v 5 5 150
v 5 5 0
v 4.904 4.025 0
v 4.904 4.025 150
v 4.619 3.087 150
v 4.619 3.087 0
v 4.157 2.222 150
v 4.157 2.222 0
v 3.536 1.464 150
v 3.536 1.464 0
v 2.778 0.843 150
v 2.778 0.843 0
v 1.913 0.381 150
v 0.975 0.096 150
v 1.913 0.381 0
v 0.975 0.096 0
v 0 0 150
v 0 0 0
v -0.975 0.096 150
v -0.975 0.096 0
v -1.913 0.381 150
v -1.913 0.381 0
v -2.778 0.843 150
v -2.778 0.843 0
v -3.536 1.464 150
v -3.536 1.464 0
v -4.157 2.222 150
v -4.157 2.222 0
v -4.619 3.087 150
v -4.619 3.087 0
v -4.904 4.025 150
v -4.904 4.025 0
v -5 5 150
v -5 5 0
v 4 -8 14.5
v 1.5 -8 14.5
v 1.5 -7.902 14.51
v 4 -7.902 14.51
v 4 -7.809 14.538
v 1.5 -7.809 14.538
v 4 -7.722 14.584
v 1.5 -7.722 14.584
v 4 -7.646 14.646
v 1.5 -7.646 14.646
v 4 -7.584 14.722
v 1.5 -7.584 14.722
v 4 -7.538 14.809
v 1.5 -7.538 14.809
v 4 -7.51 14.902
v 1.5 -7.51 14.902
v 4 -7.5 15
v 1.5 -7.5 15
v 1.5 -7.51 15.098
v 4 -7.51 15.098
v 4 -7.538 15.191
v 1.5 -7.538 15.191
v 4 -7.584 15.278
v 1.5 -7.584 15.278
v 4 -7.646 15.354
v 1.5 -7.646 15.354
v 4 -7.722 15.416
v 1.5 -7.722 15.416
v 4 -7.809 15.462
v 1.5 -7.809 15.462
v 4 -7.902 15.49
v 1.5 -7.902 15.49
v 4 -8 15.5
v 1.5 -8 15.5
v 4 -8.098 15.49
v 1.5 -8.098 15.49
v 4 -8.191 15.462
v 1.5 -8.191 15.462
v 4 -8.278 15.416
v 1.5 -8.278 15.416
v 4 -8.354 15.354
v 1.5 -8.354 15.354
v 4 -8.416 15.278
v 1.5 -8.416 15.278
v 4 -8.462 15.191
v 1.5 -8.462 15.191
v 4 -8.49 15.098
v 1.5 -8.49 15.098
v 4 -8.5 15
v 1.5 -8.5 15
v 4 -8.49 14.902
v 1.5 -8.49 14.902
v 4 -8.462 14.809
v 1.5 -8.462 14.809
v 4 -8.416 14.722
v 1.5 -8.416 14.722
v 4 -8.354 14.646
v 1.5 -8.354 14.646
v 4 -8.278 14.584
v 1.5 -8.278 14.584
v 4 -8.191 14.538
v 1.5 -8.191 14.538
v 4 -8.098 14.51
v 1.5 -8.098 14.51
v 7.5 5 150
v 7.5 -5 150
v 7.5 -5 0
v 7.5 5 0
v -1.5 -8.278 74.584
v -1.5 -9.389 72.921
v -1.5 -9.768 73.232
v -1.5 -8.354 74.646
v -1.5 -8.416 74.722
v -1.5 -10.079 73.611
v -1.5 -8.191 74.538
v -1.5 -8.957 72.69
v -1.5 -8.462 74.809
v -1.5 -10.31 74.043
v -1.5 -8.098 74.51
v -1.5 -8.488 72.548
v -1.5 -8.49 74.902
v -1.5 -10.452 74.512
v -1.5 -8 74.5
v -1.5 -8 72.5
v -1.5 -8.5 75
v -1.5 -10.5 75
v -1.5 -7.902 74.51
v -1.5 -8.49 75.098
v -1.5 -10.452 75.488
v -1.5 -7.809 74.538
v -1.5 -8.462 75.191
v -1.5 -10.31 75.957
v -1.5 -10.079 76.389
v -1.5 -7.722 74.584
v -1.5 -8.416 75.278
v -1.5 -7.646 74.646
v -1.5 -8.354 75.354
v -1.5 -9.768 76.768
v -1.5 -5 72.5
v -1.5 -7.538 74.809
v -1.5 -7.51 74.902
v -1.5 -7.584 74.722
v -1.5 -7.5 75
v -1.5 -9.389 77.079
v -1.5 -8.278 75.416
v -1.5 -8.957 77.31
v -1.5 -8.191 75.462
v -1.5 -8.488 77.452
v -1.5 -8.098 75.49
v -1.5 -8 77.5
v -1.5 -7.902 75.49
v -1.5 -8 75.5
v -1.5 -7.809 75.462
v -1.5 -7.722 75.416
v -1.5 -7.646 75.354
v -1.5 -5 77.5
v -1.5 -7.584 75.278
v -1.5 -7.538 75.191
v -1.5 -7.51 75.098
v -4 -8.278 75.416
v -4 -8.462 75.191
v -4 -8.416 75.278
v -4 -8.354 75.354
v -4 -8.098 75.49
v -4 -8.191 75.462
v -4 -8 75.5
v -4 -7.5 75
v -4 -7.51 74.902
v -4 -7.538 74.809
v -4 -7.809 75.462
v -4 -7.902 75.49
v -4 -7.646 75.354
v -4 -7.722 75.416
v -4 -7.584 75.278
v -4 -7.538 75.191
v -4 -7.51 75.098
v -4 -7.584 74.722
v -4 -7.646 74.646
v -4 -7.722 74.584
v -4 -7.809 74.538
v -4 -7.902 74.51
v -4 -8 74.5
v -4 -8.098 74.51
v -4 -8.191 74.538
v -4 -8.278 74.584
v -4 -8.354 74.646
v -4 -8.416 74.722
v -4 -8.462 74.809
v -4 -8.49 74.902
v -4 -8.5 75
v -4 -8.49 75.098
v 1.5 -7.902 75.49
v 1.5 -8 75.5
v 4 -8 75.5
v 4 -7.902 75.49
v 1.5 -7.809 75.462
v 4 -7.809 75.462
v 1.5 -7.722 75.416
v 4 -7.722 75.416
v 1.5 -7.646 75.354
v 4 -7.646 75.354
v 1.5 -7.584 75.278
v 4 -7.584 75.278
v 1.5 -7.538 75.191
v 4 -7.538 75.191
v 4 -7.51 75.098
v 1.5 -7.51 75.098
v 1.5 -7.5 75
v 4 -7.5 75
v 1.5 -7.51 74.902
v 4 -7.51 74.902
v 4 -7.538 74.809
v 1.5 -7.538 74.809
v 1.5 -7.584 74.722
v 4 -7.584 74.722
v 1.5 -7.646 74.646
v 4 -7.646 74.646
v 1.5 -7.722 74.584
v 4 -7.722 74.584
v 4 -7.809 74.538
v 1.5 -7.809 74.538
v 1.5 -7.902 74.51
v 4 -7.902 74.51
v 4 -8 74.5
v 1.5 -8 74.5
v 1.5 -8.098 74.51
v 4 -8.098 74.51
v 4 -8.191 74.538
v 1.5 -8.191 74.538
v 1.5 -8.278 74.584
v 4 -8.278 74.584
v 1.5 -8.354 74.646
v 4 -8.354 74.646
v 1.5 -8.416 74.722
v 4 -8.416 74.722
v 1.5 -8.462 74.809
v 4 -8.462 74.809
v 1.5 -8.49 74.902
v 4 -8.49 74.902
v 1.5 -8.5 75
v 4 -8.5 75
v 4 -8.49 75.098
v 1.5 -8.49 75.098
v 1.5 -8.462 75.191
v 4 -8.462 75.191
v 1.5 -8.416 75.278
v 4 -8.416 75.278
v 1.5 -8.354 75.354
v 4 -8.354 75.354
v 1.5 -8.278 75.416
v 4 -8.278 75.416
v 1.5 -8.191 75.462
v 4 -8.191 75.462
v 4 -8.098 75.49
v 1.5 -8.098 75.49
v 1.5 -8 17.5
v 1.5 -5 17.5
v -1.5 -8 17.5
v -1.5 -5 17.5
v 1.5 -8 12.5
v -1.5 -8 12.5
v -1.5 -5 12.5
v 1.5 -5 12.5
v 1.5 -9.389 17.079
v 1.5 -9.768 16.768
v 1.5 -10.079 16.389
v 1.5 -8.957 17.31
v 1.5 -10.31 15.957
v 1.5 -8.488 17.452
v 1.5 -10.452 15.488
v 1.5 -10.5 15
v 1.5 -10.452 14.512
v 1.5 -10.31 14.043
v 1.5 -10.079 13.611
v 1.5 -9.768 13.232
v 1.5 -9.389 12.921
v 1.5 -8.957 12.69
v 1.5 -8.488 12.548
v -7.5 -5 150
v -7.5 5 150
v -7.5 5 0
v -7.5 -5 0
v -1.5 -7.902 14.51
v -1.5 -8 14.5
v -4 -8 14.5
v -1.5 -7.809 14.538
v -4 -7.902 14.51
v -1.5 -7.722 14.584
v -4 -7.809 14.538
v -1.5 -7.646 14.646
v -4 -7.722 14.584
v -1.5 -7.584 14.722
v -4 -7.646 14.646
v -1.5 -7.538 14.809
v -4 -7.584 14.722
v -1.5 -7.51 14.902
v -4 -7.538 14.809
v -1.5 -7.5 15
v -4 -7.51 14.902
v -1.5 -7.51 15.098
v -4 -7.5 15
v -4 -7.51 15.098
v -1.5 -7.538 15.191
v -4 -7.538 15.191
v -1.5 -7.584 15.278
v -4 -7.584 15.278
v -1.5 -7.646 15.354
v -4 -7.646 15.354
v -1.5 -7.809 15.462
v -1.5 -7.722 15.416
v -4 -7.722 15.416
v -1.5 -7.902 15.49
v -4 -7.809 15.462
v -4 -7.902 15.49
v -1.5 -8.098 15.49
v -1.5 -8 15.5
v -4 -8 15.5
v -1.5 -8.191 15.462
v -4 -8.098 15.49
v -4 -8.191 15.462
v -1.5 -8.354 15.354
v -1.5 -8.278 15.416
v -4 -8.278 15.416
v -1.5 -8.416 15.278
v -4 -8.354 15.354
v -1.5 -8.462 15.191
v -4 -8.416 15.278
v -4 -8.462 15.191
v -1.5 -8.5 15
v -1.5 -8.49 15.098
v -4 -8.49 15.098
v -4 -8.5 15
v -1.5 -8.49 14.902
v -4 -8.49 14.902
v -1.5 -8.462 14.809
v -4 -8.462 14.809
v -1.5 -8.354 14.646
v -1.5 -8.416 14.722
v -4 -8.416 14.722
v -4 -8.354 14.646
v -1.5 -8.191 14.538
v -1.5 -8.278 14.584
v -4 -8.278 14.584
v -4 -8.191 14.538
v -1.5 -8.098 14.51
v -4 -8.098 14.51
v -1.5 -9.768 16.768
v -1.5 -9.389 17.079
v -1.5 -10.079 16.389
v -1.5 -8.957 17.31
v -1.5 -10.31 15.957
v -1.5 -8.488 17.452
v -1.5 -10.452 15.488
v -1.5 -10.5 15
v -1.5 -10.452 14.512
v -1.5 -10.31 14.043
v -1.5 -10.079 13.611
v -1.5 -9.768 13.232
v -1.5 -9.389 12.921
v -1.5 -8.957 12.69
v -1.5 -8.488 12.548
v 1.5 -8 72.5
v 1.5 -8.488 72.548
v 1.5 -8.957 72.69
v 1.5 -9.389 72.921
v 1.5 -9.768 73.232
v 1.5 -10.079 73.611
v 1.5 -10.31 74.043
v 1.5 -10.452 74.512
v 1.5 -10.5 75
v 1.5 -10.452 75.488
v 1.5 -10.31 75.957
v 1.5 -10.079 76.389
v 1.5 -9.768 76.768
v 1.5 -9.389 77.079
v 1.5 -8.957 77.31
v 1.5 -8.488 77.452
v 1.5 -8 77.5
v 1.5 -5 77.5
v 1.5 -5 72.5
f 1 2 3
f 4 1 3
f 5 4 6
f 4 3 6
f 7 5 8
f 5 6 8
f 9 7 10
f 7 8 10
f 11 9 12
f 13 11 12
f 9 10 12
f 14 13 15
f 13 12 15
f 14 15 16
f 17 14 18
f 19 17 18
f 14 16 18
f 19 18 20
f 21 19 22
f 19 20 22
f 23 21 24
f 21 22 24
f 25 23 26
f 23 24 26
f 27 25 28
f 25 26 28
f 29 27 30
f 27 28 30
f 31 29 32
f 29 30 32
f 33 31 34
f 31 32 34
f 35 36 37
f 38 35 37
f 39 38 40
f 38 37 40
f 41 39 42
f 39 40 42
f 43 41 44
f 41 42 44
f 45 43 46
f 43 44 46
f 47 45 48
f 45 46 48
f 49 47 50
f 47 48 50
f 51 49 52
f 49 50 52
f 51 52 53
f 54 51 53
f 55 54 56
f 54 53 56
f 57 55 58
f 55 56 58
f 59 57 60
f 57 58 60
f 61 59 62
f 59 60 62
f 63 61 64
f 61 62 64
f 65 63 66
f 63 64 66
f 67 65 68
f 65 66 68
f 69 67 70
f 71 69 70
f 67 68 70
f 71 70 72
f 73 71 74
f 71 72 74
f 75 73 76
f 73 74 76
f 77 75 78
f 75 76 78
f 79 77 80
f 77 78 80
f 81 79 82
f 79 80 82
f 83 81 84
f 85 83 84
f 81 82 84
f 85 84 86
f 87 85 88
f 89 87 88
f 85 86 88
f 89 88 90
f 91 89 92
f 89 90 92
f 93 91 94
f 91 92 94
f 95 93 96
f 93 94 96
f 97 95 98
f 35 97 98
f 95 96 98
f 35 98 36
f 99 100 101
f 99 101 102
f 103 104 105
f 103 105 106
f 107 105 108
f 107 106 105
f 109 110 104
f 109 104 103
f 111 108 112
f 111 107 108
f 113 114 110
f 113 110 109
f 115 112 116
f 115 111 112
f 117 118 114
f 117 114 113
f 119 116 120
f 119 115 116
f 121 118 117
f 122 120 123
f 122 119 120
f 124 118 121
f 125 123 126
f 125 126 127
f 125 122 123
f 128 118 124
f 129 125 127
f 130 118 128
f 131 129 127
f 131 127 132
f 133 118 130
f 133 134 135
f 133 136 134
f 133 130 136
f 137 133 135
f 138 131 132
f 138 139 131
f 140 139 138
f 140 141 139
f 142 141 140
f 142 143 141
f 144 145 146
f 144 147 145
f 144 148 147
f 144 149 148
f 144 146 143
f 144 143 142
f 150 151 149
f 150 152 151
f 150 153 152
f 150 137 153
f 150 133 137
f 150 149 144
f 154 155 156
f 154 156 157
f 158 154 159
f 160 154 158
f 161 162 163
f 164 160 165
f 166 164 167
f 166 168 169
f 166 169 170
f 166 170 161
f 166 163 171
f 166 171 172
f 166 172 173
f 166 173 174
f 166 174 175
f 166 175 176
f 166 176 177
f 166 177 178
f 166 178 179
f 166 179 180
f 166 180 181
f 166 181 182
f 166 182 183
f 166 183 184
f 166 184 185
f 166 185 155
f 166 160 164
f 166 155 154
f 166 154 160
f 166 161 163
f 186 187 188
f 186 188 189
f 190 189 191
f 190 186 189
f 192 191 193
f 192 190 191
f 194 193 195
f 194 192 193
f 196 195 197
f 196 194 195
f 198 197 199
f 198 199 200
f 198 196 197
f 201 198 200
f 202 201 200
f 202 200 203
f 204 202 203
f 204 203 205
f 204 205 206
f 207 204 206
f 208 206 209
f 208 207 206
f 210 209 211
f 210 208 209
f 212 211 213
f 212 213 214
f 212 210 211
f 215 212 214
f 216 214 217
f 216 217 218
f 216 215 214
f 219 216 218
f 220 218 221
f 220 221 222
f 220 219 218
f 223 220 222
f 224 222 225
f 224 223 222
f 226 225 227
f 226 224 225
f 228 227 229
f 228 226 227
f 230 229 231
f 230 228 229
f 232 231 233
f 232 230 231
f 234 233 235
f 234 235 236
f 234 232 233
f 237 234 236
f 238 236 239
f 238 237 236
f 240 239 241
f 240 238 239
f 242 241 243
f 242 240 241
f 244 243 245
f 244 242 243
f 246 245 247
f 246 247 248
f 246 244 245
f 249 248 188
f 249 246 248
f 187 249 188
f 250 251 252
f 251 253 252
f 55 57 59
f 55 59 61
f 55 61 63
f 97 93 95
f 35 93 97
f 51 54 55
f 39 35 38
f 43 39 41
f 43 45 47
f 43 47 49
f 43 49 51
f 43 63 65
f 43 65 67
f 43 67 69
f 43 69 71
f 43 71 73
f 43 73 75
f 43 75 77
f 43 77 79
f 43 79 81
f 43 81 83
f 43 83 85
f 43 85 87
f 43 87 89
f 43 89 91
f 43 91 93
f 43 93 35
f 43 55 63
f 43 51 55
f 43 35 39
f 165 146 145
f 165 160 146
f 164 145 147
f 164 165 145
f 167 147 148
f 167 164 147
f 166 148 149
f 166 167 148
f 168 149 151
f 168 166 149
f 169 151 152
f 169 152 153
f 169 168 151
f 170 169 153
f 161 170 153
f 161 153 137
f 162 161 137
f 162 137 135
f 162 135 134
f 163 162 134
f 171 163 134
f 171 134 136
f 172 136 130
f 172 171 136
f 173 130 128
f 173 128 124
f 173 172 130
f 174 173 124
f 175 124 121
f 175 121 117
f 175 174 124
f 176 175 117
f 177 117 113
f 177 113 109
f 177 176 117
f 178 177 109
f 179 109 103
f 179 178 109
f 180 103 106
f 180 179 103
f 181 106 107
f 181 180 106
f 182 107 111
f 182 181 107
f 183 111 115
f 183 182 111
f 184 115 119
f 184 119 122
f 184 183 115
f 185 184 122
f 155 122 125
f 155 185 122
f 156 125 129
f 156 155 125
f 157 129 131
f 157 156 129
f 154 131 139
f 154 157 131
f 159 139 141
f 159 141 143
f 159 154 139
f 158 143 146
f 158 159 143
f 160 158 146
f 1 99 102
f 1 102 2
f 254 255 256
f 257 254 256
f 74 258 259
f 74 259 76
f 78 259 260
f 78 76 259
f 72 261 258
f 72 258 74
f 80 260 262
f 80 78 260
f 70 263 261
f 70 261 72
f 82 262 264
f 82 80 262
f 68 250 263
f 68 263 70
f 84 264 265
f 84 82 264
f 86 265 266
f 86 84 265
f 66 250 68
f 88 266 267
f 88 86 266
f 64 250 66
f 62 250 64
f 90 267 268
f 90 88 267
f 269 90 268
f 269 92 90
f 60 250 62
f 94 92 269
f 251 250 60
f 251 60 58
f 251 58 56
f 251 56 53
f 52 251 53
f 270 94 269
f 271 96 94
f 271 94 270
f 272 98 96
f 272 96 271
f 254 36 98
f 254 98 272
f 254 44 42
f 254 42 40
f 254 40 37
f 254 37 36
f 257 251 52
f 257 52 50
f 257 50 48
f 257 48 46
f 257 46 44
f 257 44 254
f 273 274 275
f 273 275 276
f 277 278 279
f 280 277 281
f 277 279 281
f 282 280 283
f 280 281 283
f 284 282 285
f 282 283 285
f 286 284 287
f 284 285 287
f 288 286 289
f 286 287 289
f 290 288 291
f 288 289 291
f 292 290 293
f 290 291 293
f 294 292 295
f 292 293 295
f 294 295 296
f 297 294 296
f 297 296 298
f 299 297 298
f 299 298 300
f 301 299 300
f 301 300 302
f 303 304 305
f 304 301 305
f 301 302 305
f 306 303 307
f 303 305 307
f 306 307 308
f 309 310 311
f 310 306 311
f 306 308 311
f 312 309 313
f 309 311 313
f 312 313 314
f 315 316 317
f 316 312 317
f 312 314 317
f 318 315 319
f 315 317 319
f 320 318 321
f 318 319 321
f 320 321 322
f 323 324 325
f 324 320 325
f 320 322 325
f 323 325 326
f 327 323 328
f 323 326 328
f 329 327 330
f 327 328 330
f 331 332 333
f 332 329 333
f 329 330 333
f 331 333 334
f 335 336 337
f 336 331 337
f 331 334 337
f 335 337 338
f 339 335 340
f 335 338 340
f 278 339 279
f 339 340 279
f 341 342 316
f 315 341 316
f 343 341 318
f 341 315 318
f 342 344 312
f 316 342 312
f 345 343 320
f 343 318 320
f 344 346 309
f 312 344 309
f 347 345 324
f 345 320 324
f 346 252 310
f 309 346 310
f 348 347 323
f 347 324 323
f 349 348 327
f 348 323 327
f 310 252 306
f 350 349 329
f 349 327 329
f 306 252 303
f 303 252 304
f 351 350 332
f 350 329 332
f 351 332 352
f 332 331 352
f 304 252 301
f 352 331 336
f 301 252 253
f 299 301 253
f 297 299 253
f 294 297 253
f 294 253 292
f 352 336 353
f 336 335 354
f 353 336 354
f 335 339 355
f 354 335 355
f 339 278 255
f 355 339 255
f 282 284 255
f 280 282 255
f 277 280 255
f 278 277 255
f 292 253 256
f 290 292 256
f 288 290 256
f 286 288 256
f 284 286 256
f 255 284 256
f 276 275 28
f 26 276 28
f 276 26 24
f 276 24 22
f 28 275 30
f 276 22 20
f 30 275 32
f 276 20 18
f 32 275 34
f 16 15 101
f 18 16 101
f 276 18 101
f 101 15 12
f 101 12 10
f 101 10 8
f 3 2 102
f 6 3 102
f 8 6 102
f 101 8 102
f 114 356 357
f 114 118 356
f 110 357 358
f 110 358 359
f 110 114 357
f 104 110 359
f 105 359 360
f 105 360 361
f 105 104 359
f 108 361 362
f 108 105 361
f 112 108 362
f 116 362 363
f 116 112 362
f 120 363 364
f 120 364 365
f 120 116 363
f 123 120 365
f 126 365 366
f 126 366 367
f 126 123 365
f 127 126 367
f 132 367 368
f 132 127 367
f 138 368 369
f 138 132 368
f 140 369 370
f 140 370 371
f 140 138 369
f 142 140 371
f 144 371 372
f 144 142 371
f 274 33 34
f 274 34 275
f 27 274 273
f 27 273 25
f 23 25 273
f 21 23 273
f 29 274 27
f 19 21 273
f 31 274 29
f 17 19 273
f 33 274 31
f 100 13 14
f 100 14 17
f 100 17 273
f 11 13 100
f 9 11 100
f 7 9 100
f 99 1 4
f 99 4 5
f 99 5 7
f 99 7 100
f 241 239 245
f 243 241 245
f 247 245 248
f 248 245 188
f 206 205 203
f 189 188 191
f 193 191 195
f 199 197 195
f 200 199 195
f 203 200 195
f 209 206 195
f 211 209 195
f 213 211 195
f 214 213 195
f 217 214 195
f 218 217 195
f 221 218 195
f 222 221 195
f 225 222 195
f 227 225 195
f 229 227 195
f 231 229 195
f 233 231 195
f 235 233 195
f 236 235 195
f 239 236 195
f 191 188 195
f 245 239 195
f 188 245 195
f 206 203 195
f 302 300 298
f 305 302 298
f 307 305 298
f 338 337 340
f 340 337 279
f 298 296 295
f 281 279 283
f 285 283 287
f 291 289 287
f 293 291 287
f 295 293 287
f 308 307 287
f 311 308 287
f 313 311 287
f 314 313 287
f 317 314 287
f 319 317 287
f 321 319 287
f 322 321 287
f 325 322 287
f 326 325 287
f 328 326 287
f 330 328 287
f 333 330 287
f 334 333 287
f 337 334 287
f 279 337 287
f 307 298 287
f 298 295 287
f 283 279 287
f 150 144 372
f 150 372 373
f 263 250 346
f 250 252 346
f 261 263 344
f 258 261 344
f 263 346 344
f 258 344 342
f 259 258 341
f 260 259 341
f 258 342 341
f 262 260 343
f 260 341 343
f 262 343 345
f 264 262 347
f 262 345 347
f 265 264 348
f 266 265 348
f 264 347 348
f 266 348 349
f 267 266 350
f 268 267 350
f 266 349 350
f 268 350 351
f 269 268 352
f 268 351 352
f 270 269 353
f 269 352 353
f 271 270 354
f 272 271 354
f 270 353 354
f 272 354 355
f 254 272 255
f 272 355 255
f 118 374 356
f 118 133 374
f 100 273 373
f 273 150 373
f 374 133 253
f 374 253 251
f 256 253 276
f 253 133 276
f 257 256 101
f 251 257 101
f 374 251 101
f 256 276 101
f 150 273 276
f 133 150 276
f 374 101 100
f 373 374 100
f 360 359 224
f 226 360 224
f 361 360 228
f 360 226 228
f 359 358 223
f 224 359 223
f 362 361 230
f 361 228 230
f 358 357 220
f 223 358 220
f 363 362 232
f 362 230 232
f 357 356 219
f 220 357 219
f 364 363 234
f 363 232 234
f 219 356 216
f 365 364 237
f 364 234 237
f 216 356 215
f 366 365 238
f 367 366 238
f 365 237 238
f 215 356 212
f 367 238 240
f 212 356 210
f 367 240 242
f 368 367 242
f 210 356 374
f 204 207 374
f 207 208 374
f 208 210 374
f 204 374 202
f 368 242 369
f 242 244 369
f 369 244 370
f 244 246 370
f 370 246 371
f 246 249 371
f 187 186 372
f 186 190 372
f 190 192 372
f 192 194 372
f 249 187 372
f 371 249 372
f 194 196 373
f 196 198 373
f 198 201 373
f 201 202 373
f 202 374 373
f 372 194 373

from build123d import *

# Parameters (mm, degrees)
BOSS_EXTRUDE1_DEPTH = 150
BOSS_EXTRUDE6_DEPTH = 1.5
SKETCH7_R           = 0.5
BOSS_EXTRUDE7_DEPTH = 4


with BuildPart() as part:
    # Sketch1 → Boss-Extrude1 (new body)
    with BuildSketch(Plane.XY):
        with BuildLine():
            Line((7.5, 5), (5, 5))
            ThreePointArc((5, 5), (0, 0), (-5, 5))
            Line((-5, 5), (-7.5, 5))
            Line((-7.5, 5), (-7.5, -5))
            Line((-7.5, -5), (7.5, -5))
            Line((7.5, -5), (7.5, 5))
        make_face()
    extrude(amount=BOSS_EXTRUDE1_DEPTH)

    # Sketch6 → Boss-Extrude6 (add, symmetric)
    with BuildSketch(Plane.ZY):
        with BuildLine():
            ThreePointArc((77.5, -8), (75, -5.5), (72.5, -8))
            Line((72.5, -8), (77.5, -8))
        make_face()
        with BuildLine():
            Line((77.5, -8), (72.5, -8))
            ThreePointArc((72.5, -8), (75, -10.5), (77.5, -8))
        make_face()
        with BuildLine():
            Line((77.5, -5), (72.5, -5))
            Line((72.5, -5), (72.5, -8))
            ThreePointArc((72.5, -8), (75, -5.5), (77.5, -8))
            Line((77.5, -8), (77.5, -5))
        make_face()
    boss_extrude6 = extrude(amount=BOSS_EXTRUDE6_DEPTH, both=True)

    # Sketch7 → Boss-Extrude7 (add, symmetric)
    with BuildSketch(Plane.ZY):
        with Locations((75, -8)):
            Circle(SKETCH7_R)
    boss_extrude7 = extrude(amount=BOSS_EXTRUDE7_DEPTH, both=True)

    # Mirror1: Boss-Extrude6 across plane
    add(boss_extrude6.mirror(Plane(origin=(0, 0, 45), x_dir=(1, 0, 0), z_dir=(0, 0, -1))))

    # Mirror2: Boss-Extrude7 across plane
    add(boss_extrude7.mirror(Plane(origin=(0, 0, 45), x_dir=(1, 0, 0), z_dir=(0, 0, -1))))


solid = part.part
